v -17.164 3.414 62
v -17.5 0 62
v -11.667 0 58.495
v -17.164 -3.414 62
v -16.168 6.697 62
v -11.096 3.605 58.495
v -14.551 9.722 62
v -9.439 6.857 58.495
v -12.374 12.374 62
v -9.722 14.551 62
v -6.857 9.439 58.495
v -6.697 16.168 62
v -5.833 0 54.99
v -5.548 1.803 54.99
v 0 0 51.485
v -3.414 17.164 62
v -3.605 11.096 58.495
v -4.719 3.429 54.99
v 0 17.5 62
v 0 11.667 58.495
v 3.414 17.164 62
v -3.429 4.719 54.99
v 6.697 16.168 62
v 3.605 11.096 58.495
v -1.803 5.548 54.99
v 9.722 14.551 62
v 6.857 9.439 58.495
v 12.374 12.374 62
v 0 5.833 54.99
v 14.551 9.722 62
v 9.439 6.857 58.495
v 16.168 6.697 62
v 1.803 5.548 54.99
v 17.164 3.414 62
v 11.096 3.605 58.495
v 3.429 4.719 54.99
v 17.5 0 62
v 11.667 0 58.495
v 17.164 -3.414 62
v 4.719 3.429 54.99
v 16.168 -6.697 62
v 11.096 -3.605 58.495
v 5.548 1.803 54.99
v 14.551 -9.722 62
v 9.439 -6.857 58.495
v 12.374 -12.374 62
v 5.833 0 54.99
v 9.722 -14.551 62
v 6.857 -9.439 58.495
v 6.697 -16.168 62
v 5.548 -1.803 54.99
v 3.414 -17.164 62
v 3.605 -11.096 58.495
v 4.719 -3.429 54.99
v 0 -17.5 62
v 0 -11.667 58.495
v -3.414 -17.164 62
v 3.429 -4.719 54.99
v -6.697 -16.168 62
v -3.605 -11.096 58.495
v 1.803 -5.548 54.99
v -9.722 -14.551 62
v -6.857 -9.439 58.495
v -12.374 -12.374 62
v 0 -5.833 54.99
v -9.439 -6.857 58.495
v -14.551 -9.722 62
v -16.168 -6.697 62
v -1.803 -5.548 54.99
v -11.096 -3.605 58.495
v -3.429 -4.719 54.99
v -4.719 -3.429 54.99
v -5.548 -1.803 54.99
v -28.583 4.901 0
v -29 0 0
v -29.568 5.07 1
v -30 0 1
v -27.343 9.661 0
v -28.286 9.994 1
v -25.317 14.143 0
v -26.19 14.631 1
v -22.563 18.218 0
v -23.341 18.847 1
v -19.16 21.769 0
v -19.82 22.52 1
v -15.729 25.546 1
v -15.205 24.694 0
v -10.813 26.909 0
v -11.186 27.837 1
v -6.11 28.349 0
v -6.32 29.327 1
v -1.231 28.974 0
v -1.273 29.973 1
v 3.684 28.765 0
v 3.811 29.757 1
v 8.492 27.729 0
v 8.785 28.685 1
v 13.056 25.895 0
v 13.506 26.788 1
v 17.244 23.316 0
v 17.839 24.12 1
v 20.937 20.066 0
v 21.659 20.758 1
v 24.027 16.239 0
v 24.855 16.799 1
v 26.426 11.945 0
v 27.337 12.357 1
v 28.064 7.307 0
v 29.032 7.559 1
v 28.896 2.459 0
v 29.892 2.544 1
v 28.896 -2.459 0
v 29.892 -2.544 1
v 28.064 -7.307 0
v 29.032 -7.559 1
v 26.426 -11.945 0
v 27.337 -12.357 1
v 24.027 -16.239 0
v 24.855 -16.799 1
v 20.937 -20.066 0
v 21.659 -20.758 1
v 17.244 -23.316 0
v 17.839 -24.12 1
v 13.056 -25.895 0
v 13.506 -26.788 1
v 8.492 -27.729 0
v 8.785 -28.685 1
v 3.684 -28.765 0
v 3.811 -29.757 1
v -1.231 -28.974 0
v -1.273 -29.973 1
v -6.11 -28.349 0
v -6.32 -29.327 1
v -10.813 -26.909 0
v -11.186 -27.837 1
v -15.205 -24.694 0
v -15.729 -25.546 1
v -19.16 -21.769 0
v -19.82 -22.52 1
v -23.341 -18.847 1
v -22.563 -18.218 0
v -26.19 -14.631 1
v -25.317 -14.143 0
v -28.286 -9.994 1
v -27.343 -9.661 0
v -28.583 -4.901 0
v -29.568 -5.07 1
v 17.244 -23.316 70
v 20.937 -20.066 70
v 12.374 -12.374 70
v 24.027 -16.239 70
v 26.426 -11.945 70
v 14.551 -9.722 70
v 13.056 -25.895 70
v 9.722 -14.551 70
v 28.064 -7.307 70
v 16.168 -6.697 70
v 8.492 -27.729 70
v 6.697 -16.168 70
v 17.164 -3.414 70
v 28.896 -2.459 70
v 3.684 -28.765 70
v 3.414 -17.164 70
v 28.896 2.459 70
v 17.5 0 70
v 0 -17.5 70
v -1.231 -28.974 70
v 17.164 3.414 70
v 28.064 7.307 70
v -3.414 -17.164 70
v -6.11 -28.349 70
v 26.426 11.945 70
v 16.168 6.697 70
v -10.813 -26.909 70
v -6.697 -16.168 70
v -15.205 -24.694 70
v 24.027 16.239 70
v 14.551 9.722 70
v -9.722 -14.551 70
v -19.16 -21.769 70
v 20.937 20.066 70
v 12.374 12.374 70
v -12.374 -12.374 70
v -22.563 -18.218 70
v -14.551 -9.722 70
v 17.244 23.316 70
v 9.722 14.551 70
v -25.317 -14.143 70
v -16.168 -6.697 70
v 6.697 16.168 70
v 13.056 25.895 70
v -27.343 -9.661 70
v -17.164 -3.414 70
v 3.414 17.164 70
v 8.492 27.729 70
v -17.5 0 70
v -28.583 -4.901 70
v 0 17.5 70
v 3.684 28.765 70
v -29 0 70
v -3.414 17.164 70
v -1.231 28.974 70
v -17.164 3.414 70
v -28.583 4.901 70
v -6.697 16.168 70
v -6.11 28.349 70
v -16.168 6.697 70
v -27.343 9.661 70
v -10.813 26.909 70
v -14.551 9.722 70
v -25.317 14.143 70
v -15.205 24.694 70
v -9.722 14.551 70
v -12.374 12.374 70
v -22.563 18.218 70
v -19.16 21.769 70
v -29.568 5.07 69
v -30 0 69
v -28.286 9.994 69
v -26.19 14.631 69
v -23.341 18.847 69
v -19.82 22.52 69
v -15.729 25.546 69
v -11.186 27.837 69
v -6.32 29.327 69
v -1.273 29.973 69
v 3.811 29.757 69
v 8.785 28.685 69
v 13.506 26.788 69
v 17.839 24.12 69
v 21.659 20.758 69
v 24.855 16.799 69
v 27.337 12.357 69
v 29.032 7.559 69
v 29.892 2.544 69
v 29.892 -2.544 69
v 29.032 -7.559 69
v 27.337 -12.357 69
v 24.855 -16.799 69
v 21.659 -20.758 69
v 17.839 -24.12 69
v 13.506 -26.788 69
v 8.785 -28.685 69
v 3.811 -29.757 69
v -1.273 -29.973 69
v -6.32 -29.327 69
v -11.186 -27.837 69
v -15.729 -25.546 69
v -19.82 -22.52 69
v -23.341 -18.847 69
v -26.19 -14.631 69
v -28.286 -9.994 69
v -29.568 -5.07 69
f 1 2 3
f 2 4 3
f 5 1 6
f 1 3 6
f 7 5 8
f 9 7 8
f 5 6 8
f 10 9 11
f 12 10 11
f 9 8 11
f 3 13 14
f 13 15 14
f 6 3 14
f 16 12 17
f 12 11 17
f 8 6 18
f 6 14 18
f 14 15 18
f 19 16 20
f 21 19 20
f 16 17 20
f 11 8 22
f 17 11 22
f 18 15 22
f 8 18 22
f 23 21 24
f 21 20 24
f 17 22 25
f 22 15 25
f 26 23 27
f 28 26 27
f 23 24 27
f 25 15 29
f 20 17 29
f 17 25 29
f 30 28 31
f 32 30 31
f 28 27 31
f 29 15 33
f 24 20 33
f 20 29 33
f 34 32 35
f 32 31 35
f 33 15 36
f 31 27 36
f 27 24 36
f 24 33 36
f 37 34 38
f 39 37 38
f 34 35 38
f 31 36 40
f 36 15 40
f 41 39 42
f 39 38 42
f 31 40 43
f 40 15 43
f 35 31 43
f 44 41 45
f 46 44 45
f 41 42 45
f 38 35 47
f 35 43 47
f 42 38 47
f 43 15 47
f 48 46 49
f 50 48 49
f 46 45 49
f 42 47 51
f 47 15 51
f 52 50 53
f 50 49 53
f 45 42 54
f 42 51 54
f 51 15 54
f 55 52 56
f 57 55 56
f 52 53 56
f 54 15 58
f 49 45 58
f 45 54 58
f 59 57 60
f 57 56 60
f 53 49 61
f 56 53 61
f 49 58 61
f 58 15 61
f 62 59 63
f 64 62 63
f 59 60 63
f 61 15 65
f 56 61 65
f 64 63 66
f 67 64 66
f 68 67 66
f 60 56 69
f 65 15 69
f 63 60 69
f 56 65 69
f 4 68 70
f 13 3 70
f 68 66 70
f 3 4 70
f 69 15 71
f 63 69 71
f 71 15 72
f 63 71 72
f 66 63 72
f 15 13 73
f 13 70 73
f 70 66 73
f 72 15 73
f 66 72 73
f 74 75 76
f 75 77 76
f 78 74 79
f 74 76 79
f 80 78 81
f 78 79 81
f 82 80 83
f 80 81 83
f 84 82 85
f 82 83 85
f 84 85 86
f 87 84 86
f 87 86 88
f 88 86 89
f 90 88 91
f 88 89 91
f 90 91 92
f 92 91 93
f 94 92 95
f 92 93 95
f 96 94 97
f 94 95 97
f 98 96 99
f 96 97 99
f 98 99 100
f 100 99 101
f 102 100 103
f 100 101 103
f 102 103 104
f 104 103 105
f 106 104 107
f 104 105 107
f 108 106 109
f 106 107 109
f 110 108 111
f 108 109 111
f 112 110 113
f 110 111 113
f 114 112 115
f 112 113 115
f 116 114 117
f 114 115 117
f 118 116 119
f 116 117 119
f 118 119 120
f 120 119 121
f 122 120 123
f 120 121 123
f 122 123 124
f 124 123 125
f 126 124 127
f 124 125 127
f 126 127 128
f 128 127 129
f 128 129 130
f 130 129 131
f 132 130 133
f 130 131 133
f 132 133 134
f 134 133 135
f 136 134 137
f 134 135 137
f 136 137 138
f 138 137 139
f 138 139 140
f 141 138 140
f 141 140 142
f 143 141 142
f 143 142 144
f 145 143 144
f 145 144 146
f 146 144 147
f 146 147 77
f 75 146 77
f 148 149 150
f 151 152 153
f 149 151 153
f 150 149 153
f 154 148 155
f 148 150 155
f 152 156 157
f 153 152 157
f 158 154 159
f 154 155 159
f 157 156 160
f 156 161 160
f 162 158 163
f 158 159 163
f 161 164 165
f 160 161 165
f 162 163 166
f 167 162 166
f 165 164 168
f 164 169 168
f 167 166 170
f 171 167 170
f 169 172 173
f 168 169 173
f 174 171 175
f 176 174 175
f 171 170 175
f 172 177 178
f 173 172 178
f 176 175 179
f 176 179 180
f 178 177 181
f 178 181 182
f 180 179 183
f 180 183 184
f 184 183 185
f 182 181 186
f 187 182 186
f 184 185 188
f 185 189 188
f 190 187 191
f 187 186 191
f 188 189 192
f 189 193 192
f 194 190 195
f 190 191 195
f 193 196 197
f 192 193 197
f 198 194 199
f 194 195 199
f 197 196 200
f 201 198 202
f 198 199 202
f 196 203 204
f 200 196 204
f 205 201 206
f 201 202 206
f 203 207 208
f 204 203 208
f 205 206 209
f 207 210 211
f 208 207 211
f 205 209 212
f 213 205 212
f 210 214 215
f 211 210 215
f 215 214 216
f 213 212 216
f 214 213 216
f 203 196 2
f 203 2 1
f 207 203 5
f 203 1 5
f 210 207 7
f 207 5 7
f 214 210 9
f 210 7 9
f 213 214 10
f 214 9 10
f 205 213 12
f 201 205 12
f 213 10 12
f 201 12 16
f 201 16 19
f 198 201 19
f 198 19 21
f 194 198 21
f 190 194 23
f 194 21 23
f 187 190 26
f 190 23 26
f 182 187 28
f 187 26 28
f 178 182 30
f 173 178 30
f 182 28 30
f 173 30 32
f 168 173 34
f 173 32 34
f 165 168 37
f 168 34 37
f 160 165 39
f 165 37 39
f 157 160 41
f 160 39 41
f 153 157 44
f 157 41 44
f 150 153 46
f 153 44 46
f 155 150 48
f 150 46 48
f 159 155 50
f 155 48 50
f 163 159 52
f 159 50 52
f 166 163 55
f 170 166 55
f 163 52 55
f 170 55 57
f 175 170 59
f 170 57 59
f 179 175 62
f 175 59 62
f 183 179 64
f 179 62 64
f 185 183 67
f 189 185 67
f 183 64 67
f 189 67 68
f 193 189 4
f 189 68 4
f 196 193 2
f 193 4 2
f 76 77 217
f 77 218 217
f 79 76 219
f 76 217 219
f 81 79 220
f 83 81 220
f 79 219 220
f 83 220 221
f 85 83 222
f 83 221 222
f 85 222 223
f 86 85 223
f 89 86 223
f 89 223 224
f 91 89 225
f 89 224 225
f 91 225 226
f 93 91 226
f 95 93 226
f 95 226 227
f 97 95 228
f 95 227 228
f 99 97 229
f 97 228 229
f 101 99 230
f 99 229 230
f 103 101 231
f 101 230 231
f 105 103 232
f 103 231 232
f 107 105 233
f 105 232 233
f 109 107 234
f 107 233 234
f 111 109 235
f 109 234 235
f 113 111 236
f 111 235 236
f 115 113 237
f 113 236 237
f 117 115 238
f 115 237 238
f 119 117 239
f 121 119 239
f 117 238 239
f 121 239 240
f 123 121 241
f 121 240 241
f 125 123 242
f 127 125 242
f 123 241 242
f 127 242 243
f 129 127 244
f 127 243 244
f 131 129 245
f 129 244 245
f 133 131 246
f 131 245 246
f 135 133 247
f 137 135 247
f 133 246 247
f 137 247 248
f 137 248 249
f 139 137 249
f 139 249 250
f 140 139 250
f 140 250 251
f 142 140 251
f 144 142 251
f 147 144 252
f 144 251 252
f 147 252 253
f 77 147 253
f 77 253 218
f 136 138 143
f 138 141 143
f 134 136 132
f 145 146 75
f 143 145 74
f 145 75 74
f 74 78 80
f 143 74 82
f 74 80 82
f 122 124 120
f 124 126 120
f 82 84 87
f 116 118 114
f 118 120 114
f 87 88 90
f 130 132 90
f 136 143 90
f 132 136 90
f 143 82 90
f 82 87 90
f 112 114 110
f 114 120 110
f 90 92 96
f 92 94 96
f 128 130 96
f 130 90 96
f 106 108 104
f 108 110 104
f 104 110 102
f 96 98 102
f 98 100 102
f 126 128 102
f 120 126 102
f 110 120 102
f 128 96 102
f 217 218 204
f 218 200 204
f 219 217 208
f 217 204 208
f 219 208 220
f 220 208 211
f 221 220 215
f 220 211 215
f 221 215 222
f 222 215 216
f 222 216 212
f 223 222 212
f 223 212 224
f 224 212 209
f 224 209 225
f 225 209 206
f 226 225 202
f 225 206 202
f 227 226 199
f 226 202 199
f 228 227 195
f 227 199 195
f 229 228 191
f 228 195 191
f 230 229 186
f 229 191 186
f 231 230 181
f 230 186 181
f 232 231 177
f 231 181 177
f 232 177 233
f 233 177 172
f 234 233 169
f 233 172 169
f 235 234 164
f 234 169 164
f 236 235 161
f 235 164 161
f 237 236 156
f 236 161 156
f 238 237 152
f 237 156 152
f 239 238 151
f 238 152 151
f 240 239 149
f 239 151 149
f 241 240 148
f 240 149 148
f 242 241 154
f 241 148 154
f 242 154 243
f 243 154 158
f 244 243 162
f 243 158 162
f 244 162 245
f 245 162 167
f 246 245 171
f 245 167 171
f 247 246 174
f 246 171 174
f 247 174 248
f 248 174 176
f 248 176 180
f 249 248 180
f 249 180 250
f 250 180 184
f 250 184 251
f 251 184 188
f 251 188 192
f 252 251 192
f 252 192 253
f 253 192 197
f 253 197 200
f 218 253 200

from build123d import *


with BuildPart() as part:
    # Esquisse1 → Révolution1 (revolve)
    with BuildSketch(Plane.XZ, mode=Mode.PRIVATE) as r_volution1_sk:
        Polygon((17.5, 62), (0, 51.484939167), (0, 0), (29, 0), (30, 1), (30, 69), (29, 70), (17.5, 70), align=None)
    revolve(r_volution1_sk.sketch.rotate(Axis((0, 0, 70), (0, 0, -1)), 180), axis=Axis((0, 0, 70), (0, 0, -1)))


solid = part.part
